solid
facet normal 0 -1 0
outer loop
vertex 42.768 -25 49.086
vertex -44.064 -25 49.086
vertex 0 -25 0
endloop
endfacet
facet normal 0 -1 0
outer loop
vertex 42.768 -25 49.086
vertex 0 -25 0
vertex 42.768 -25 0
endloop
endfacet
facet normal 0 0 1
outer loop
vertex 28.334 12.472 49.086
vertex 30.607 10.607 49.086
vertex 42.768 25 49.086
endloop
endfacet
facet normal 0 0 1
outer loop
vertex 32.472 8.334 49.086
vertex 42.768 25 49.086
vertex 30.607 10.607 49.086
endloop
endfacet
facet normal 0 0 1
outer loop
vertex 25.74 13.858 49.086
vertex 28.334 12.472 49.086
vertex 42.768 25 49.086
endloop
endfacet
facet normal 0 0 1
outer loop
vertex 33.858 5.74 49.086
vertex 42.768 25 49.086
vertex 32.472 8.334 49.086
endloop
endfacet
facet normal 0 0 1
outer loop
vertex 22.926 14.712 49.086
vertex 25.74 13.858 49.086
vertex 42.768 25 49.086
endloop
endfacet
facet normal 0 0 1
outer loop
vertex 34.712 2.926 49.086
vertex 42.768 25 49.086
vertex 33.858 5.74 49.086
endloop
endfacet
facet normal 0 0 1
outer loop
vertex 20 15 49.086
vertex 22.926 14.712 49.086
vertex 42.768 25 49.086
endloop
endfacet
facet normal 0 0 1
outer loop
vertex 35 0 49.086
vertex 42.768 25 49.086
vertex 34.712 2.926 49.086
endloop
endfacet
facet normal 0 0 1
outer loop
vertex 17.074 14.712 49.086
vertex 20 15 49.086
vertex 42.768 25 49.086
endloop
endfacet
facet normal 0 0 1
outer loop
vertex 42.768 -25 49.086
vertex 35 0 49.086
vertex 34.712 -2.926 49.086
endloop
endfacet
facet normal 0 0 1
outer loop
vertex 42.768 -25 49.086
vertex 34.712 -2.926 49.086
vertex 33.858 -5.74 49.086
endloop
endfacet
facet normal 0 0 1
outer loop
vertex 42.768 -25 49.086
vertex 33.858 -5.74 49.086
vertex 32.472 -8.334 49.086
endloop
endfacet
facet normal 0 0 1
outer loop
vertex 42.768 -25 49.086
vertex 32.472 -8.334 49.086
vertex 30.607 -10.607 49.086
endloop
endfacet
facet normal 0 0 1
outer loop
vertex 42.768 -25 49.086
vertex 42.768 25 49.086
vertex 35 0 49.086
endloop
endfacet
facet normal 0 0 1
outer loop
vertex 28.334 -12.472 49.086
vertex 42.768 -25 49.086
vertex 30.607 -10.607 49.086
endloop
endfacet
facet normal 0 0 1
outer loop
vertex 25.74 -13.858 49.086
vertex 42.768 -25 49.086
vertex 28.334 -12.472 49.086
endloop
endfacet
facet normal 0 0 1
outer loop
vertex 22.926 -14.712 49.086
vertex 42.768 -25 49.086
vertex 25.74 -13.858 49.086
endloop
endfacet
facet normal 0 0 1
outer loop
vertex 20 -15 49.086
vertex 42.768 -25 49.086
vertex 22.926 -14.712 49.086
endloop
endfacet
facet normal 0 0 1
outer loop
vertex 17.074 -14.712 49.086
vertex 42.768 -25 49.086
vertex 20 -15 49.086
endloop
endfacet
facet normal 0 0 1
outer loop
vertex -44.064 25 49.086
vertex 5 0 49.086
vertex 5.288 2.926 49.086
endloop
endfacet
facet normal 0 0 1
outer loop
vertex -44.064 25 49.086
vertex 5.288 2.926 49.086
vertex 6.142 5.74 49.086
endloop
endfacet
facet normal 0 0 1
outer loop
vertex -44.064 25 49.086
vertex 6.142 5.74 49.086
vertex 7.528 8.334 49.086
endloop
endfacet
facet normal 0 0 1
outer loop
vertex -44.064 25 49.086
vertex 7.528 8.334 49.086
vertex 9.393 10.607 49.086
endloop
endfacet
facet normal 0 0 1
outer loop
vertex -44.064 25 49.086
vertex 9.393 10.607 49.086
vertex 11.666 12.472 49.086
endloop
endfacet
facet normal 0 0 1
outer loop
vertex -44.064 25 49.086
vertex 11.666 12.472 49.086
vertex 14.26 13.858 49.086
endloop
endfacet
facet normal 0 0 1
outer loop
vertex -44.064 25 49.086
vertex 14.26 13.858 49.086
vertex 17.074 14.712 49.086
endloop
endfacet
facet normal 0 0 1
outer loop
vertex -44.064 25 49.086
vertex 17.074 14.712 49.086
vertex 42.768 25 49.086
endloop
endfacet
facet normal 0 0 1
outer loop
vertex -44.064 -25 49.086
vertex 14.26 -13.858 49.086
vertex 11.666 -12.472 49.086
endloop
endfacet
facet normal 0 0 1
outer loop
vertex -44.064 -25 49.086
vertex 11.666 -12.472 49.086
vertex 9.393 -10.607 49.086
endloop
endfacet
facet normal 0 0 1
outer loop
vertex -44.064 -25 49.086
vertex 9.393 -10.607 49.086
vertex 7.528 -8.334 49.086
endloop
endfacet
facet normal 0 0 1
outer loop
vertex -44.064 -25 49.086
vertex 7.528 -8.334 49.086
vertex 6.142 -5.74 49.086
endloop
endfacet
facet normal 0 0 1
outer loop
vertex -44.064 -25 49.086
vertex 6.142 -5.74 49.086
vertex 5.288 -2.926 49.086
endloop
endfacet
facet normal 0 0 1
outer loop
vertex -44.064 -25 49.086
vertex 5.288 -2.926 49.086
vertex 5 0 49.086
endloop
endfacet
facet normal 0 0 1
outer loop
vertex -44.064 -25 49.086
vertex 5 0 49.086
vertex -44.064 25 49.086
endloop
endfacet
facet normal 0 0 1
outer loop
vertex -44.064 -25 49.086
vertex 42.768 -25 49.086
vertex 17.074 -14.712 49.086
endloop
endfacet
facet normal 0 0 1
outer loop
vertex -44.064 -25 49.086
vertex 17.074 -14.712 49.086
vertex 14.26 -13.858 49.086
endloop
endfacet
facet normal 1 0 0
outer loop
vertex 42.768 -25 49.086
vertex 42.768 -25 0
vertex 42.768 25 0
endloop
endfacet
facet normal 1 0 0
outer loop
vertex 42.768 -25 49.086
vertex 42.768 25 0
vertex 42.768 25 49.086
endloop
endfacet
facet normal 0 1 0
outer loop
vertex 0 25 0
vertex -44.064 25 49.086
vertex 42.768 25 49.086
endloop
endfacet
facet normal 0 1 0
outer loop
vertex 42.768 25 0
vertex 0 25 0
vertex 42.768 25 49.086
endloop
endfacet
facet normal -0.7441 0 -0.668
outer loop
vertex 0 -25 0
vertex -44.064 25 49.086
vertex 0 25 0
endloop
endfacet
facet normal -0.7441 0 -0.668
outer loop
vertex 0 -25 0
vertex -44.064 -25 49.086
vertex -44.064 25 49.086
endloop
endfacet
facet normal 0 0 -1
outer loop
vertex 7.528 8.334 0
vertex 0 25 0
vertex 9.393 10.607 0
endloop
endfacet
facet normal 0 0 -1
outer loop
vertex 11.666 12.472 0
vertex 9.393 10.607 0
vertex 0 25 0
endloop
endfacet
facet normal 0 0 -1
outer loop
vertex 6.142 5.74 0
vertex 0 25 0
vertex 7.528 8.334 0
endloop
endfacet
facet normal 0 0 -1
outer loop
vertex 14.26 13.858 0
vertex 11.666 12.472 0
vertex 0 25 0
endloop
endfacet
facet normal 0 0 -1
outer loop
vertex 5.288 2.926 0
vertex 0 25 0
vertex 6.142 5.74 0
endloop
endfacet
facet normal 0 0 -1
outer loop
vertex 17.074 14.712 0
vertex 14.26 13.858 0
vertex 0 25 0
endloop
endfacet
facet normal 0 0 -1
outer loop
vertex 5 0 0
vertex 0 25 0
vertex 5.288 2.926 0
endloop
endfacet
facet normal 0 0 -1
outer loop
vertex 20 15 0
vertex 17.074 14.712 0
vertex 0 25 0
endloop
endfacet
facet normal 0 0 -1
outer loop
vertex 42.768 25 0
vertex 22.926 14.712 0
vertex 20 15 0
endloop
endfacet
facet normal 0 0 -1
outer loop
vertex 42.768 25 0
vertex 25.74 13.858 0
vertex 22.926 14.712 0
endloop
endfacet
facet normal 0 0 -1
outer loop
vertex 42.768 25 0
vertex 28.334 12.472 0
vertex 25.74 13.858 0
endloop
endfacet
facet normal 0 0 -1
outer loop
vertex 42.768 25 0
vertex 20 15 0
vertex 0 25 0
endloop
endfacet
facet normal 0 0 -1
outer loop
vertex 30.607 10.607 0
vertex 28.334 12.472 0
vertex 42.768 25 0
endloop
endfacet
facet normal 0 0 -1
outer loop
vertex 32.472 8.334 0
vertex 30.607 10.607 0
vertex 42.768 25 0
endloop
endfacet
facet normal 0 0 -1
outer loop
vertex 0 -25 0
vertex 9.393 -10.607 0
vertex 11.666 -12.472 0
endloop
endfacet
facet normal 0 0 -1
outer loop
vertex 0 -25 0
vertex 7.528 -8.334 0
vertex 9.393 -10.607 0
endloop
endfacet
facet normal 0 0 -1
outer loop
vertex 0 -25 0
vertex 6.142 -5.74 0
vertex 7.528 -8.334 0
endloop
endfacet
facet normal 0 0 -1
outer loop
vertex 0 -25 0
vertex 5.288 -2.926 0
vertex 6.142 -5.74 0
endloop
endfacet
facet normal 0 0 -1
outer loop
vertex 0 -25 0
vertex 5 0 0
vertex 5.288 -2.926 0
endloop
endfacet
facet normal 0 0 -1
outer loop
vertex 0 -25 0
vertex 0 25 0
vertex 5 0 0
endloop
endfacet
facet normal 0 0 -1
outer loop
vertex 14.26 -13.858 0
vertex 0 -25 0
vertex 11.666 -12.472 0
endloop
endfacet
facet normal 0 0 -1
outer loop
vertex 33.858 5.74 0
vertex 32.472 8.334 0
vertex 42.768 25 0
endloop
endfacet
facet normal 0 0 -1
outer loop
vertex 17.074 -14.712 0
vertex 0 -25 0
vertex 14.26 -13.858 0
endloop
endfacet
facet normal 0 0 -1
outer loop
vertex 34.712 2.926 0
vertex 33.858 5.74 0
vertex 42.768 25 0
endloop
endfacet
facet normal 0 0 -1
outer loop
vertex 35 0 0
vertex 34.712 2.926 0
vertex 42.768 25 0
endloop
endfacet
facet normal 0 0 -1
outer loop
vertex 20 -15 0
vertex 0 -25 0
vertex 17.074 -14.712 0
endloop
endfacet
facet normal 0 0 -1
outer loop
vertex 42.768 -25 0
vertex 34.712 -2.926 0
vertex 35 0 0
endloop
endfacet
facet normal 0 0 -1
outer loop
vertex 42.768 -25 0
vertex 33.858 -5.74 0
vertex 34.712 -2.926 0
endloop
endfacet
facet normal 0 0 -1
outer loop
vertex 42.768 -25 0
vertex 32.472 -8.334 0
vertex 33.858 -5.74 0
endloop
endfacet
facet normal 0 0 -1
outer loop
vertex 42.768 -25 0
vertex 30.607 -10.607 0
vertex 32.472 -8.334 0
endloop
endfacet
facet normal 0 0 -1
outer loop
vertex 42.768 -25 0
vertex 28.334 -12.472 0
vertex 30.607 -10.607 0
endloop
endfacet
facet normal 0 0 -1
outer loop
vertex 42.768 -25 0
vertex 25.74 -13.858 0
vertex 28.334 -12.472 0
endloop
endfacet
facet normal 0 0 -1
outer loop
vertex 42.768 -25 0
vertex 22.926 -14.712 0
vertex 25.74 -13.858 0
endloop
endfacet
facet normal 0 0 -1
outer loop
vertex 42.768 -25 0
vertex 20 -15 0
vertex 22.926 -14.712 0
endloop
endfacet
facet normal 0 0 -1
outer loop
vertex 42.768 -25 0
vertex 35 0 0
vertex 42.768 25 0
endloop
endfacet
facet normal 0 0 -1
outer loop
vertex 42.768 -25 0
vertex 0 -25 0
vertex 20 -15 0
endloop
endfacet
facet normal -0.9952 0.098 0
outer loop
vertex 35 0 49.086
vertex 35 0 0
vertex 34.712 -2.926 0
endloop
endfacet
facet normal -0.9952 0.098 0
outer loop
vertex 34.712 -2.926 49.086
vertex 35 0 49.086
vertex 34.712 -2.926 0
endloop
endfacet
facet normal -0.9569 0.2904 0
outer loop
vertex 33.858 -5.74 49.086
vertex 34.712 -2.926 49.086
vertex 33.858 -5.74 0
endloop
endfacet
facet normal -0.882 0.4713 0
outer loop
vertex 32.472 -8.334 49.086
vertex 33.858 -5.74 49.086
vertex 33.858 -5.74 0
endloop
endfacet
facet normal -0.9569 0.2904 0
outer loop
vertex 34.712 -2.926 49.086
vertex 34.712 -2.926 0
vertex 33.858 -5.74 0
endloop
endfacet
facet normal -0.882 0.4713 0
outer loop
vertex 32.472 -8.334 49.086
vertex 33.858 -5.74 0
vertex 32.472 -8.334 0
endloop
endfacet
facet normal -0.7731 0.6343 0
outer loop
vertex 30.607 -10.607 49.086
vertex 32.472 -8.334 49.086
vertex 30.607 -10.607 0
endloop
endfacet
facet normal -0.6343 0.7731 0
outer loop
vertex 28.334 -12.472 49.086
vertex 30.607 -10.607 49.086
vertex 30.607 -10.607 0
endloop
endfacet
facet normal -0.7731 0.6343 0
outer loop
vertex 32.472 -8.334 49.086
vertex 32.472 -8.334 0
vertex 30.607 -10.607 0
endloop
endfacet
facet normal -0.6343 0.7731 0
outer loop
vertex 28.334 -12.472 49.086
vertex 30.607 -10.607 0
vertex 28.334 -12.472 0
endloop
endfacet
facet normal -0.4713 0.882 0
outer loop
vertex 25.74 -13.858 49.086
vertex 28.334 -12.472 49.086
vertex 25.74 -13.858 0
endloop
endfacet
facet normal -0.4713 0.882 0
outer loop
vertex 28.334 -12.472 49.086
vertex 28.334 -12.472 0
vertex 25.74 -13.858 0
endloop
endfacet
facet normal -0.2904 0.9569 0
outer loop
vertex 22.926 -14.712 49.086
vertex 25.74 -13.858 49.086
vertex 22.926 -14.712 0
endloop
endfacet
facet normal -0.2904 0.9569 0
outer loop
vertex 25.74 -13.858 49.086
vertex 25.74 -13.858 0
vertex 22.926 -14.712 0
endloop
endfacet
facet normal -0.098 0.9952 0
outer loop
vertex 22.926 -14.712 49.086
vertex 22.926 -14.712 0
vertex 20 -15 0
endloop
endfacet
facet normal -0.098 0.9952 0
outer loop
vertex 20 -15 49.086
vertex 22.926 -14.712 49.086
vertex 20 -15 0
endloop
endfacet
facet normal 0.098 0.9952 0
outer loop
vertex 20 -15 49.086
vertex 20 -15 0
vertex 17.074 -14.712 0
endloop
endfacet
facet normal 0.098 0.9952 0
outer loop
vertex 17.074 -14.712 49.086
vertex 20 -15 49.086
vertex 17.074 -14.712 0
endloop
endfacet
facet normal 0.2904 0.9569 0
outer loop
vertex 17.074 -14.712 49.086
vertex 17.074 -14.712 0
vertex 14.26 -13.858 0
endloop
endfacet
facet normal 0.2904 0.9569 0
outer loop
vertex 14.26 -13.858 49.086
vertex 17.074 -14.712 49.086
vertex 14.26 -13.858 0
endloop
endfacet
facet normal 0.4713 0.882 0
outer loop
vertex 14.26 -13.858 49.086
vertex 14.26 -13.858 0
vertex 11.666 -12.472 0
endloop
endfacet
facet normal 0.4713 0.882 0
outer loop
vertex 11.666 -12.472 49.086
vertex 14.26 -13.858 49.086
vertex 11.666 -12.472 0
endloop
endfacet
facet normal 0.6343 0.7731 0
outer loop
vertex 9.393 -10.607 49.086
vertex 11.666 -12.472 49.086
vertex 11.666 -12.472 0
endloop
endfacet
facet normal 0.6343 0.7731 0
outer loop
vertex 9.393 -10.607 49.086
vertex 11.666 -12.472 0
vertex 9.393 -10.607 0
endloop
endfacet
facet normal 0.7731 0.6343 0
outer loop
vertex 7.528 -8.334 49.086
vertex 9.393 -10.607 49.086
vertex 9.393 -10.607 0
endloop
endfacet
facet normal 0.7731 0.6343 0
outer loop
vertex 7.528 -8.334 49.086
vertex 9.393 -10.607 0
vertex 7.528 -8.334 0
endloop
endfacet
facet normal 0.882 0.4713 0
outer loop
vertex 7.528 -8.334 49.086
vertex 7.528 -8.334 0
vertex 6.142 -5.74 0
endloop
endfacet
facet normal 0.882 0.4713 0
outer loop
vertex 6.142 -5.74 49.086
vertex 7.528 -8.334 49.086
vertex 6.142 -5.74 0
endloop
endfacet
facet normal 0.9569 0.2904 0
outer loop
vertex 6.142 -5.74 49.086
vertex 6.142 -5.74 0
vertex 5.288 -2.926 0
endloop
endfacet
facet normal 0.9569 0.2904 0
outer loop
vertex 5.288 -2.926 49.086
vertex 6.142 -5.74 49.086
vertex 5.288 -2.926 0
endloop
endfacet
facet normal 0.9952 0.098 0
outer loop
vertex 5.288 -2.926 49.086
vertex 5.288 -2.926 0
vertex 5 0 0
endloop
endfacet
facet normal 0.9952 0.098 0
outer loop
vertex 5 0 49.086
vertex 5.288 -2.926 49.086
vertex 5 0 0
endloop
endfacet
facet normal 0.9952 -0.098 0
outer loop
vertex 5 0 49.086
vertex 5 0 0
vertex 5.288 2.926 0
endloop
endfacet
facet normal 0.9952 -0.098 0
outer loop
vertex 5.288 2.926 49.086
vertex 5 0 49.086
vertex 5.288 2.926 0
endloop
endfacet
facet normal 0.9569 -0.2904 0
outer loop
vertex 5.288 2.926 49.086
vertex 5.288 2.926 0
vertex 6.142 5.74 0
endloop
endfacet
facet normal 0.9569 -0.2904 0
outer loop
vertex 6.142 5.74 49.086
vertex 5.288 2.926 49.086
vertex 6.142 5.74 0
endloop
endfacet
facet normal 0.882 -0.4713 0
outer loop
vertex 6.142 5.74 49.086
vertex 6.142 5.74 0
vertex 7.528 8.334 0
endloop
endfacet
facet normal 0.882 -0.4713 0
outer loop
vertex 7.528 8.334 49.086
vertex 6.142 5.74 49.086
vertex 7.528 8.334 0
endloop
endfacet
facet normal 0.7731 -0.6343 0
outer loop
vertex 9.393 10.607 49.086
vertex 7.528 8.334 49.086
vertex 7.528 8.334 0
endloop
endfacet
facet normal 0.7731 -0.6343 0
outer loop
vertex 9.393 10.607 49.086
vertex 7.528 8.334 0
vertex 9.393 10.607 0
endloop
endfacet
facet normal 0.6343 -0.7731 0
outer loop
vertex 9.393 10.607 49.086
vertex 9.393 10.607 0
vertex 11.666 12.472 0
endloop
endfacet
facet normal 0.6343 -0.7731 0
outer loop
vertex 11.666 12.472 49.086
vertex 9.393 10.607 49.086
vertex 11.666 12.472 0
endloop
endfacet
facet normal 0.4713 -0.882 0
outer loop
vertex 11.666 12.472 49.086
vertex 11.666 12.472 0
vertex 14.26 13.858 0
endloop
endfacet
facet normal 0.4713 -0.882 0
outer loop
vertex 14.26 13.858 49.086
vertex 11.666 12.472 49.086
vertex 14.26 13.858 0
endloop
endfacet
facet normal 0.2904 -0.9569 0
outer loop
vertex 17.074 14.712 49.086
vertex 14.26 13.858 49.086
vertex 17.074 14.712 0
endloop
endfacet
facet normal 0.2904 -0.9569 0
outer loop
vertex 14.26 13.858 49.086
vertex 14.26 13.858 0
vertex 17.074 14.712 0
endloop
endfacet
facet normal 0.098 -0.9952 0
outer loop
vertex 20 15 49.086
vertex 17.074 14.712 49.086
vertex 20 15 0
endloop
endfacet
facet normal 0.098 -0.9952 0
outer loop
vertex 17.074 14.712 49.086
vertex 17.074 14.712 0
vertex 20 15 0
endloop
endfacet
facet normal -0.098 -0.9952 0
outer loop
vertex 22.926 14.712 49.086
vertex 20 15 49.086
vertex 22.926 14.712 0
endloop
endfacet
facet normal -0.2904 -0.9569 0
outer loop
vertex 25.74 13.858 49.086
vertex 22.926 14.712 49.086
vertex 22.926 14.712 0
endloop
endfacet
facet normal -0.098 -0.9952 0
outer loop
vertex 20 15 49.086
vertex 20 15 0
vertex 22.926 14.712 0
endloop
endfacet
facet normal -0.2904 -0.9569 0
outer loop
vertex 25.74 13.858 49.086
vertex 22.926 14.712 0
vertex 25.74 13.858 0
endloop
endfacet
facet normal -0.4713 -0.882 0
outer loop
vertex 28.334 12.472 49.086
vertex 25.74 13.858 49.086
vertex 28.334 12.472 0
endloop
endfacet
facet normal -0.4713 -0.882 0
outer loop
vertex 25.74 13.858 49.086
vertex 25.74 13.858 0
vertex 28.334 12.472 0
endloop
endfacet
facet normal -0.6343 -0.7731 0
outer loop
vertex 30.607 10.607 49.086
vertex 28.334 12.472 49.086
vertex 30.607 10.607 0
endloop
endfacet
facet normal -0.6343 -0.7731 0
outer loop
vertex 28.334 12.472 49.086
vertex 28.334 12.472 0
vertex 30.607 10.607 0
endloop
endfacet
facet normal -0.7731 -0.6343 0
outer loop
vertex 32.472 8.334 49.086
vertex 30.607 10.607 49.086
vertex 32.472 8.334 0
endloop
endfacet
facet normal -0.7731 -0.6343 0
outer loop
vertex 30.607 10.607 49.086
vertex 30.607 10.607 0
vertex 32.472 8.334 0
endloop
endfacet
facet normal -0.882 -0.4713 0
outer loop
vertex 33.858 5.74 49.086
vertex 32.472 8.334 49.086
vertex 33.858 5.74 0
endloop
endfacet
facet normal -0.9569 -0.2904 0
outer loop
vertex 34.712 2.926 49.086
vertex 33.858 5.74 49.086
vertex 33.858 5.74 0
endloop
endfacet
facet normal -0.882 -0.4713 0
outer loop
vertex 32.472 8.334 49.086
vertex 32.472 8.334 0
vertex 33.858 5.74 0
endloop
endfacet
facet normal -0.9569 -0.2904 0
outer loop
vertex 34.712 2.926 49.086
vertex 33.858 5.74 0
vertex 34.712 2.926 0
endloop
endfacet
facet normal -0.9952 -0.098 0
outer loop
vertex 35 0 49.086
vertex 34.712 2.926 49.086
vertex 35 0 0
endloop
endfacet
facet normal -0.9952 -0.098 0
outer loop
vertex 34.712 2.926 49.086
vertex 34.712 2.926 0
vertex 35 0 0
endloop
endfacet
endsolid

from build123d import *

# Parameters (mm, degrees)
F1_DEPTH = 25
F2_R     = 15
F3_DEPTH = 49.087306


with BuildPart() as f1:
    # F0 (on Front) → F1 (new body, symmetric)
    with BuildSketch(Plane.XZ):
        Polygon((-44.064272, 49.086306), (0, 0), (42.768266, 0), (42.768266, 49.086306), align=None)
    extrude(amount=F1_DEPTH, both=True)

    # F2 (on face) → F3 (cut, through all)
    with BuildSketch(Plane(origin=(0, 0, 0), x_dir=(1, 0, 0), z_dir=(0, 0, -1))):
        with Locations((20, 0)):
            Circle(F2_R)
    extrude(amount=-F3_DEPTH, mode=Mode.SUBTRACT)


solid = f1.part
